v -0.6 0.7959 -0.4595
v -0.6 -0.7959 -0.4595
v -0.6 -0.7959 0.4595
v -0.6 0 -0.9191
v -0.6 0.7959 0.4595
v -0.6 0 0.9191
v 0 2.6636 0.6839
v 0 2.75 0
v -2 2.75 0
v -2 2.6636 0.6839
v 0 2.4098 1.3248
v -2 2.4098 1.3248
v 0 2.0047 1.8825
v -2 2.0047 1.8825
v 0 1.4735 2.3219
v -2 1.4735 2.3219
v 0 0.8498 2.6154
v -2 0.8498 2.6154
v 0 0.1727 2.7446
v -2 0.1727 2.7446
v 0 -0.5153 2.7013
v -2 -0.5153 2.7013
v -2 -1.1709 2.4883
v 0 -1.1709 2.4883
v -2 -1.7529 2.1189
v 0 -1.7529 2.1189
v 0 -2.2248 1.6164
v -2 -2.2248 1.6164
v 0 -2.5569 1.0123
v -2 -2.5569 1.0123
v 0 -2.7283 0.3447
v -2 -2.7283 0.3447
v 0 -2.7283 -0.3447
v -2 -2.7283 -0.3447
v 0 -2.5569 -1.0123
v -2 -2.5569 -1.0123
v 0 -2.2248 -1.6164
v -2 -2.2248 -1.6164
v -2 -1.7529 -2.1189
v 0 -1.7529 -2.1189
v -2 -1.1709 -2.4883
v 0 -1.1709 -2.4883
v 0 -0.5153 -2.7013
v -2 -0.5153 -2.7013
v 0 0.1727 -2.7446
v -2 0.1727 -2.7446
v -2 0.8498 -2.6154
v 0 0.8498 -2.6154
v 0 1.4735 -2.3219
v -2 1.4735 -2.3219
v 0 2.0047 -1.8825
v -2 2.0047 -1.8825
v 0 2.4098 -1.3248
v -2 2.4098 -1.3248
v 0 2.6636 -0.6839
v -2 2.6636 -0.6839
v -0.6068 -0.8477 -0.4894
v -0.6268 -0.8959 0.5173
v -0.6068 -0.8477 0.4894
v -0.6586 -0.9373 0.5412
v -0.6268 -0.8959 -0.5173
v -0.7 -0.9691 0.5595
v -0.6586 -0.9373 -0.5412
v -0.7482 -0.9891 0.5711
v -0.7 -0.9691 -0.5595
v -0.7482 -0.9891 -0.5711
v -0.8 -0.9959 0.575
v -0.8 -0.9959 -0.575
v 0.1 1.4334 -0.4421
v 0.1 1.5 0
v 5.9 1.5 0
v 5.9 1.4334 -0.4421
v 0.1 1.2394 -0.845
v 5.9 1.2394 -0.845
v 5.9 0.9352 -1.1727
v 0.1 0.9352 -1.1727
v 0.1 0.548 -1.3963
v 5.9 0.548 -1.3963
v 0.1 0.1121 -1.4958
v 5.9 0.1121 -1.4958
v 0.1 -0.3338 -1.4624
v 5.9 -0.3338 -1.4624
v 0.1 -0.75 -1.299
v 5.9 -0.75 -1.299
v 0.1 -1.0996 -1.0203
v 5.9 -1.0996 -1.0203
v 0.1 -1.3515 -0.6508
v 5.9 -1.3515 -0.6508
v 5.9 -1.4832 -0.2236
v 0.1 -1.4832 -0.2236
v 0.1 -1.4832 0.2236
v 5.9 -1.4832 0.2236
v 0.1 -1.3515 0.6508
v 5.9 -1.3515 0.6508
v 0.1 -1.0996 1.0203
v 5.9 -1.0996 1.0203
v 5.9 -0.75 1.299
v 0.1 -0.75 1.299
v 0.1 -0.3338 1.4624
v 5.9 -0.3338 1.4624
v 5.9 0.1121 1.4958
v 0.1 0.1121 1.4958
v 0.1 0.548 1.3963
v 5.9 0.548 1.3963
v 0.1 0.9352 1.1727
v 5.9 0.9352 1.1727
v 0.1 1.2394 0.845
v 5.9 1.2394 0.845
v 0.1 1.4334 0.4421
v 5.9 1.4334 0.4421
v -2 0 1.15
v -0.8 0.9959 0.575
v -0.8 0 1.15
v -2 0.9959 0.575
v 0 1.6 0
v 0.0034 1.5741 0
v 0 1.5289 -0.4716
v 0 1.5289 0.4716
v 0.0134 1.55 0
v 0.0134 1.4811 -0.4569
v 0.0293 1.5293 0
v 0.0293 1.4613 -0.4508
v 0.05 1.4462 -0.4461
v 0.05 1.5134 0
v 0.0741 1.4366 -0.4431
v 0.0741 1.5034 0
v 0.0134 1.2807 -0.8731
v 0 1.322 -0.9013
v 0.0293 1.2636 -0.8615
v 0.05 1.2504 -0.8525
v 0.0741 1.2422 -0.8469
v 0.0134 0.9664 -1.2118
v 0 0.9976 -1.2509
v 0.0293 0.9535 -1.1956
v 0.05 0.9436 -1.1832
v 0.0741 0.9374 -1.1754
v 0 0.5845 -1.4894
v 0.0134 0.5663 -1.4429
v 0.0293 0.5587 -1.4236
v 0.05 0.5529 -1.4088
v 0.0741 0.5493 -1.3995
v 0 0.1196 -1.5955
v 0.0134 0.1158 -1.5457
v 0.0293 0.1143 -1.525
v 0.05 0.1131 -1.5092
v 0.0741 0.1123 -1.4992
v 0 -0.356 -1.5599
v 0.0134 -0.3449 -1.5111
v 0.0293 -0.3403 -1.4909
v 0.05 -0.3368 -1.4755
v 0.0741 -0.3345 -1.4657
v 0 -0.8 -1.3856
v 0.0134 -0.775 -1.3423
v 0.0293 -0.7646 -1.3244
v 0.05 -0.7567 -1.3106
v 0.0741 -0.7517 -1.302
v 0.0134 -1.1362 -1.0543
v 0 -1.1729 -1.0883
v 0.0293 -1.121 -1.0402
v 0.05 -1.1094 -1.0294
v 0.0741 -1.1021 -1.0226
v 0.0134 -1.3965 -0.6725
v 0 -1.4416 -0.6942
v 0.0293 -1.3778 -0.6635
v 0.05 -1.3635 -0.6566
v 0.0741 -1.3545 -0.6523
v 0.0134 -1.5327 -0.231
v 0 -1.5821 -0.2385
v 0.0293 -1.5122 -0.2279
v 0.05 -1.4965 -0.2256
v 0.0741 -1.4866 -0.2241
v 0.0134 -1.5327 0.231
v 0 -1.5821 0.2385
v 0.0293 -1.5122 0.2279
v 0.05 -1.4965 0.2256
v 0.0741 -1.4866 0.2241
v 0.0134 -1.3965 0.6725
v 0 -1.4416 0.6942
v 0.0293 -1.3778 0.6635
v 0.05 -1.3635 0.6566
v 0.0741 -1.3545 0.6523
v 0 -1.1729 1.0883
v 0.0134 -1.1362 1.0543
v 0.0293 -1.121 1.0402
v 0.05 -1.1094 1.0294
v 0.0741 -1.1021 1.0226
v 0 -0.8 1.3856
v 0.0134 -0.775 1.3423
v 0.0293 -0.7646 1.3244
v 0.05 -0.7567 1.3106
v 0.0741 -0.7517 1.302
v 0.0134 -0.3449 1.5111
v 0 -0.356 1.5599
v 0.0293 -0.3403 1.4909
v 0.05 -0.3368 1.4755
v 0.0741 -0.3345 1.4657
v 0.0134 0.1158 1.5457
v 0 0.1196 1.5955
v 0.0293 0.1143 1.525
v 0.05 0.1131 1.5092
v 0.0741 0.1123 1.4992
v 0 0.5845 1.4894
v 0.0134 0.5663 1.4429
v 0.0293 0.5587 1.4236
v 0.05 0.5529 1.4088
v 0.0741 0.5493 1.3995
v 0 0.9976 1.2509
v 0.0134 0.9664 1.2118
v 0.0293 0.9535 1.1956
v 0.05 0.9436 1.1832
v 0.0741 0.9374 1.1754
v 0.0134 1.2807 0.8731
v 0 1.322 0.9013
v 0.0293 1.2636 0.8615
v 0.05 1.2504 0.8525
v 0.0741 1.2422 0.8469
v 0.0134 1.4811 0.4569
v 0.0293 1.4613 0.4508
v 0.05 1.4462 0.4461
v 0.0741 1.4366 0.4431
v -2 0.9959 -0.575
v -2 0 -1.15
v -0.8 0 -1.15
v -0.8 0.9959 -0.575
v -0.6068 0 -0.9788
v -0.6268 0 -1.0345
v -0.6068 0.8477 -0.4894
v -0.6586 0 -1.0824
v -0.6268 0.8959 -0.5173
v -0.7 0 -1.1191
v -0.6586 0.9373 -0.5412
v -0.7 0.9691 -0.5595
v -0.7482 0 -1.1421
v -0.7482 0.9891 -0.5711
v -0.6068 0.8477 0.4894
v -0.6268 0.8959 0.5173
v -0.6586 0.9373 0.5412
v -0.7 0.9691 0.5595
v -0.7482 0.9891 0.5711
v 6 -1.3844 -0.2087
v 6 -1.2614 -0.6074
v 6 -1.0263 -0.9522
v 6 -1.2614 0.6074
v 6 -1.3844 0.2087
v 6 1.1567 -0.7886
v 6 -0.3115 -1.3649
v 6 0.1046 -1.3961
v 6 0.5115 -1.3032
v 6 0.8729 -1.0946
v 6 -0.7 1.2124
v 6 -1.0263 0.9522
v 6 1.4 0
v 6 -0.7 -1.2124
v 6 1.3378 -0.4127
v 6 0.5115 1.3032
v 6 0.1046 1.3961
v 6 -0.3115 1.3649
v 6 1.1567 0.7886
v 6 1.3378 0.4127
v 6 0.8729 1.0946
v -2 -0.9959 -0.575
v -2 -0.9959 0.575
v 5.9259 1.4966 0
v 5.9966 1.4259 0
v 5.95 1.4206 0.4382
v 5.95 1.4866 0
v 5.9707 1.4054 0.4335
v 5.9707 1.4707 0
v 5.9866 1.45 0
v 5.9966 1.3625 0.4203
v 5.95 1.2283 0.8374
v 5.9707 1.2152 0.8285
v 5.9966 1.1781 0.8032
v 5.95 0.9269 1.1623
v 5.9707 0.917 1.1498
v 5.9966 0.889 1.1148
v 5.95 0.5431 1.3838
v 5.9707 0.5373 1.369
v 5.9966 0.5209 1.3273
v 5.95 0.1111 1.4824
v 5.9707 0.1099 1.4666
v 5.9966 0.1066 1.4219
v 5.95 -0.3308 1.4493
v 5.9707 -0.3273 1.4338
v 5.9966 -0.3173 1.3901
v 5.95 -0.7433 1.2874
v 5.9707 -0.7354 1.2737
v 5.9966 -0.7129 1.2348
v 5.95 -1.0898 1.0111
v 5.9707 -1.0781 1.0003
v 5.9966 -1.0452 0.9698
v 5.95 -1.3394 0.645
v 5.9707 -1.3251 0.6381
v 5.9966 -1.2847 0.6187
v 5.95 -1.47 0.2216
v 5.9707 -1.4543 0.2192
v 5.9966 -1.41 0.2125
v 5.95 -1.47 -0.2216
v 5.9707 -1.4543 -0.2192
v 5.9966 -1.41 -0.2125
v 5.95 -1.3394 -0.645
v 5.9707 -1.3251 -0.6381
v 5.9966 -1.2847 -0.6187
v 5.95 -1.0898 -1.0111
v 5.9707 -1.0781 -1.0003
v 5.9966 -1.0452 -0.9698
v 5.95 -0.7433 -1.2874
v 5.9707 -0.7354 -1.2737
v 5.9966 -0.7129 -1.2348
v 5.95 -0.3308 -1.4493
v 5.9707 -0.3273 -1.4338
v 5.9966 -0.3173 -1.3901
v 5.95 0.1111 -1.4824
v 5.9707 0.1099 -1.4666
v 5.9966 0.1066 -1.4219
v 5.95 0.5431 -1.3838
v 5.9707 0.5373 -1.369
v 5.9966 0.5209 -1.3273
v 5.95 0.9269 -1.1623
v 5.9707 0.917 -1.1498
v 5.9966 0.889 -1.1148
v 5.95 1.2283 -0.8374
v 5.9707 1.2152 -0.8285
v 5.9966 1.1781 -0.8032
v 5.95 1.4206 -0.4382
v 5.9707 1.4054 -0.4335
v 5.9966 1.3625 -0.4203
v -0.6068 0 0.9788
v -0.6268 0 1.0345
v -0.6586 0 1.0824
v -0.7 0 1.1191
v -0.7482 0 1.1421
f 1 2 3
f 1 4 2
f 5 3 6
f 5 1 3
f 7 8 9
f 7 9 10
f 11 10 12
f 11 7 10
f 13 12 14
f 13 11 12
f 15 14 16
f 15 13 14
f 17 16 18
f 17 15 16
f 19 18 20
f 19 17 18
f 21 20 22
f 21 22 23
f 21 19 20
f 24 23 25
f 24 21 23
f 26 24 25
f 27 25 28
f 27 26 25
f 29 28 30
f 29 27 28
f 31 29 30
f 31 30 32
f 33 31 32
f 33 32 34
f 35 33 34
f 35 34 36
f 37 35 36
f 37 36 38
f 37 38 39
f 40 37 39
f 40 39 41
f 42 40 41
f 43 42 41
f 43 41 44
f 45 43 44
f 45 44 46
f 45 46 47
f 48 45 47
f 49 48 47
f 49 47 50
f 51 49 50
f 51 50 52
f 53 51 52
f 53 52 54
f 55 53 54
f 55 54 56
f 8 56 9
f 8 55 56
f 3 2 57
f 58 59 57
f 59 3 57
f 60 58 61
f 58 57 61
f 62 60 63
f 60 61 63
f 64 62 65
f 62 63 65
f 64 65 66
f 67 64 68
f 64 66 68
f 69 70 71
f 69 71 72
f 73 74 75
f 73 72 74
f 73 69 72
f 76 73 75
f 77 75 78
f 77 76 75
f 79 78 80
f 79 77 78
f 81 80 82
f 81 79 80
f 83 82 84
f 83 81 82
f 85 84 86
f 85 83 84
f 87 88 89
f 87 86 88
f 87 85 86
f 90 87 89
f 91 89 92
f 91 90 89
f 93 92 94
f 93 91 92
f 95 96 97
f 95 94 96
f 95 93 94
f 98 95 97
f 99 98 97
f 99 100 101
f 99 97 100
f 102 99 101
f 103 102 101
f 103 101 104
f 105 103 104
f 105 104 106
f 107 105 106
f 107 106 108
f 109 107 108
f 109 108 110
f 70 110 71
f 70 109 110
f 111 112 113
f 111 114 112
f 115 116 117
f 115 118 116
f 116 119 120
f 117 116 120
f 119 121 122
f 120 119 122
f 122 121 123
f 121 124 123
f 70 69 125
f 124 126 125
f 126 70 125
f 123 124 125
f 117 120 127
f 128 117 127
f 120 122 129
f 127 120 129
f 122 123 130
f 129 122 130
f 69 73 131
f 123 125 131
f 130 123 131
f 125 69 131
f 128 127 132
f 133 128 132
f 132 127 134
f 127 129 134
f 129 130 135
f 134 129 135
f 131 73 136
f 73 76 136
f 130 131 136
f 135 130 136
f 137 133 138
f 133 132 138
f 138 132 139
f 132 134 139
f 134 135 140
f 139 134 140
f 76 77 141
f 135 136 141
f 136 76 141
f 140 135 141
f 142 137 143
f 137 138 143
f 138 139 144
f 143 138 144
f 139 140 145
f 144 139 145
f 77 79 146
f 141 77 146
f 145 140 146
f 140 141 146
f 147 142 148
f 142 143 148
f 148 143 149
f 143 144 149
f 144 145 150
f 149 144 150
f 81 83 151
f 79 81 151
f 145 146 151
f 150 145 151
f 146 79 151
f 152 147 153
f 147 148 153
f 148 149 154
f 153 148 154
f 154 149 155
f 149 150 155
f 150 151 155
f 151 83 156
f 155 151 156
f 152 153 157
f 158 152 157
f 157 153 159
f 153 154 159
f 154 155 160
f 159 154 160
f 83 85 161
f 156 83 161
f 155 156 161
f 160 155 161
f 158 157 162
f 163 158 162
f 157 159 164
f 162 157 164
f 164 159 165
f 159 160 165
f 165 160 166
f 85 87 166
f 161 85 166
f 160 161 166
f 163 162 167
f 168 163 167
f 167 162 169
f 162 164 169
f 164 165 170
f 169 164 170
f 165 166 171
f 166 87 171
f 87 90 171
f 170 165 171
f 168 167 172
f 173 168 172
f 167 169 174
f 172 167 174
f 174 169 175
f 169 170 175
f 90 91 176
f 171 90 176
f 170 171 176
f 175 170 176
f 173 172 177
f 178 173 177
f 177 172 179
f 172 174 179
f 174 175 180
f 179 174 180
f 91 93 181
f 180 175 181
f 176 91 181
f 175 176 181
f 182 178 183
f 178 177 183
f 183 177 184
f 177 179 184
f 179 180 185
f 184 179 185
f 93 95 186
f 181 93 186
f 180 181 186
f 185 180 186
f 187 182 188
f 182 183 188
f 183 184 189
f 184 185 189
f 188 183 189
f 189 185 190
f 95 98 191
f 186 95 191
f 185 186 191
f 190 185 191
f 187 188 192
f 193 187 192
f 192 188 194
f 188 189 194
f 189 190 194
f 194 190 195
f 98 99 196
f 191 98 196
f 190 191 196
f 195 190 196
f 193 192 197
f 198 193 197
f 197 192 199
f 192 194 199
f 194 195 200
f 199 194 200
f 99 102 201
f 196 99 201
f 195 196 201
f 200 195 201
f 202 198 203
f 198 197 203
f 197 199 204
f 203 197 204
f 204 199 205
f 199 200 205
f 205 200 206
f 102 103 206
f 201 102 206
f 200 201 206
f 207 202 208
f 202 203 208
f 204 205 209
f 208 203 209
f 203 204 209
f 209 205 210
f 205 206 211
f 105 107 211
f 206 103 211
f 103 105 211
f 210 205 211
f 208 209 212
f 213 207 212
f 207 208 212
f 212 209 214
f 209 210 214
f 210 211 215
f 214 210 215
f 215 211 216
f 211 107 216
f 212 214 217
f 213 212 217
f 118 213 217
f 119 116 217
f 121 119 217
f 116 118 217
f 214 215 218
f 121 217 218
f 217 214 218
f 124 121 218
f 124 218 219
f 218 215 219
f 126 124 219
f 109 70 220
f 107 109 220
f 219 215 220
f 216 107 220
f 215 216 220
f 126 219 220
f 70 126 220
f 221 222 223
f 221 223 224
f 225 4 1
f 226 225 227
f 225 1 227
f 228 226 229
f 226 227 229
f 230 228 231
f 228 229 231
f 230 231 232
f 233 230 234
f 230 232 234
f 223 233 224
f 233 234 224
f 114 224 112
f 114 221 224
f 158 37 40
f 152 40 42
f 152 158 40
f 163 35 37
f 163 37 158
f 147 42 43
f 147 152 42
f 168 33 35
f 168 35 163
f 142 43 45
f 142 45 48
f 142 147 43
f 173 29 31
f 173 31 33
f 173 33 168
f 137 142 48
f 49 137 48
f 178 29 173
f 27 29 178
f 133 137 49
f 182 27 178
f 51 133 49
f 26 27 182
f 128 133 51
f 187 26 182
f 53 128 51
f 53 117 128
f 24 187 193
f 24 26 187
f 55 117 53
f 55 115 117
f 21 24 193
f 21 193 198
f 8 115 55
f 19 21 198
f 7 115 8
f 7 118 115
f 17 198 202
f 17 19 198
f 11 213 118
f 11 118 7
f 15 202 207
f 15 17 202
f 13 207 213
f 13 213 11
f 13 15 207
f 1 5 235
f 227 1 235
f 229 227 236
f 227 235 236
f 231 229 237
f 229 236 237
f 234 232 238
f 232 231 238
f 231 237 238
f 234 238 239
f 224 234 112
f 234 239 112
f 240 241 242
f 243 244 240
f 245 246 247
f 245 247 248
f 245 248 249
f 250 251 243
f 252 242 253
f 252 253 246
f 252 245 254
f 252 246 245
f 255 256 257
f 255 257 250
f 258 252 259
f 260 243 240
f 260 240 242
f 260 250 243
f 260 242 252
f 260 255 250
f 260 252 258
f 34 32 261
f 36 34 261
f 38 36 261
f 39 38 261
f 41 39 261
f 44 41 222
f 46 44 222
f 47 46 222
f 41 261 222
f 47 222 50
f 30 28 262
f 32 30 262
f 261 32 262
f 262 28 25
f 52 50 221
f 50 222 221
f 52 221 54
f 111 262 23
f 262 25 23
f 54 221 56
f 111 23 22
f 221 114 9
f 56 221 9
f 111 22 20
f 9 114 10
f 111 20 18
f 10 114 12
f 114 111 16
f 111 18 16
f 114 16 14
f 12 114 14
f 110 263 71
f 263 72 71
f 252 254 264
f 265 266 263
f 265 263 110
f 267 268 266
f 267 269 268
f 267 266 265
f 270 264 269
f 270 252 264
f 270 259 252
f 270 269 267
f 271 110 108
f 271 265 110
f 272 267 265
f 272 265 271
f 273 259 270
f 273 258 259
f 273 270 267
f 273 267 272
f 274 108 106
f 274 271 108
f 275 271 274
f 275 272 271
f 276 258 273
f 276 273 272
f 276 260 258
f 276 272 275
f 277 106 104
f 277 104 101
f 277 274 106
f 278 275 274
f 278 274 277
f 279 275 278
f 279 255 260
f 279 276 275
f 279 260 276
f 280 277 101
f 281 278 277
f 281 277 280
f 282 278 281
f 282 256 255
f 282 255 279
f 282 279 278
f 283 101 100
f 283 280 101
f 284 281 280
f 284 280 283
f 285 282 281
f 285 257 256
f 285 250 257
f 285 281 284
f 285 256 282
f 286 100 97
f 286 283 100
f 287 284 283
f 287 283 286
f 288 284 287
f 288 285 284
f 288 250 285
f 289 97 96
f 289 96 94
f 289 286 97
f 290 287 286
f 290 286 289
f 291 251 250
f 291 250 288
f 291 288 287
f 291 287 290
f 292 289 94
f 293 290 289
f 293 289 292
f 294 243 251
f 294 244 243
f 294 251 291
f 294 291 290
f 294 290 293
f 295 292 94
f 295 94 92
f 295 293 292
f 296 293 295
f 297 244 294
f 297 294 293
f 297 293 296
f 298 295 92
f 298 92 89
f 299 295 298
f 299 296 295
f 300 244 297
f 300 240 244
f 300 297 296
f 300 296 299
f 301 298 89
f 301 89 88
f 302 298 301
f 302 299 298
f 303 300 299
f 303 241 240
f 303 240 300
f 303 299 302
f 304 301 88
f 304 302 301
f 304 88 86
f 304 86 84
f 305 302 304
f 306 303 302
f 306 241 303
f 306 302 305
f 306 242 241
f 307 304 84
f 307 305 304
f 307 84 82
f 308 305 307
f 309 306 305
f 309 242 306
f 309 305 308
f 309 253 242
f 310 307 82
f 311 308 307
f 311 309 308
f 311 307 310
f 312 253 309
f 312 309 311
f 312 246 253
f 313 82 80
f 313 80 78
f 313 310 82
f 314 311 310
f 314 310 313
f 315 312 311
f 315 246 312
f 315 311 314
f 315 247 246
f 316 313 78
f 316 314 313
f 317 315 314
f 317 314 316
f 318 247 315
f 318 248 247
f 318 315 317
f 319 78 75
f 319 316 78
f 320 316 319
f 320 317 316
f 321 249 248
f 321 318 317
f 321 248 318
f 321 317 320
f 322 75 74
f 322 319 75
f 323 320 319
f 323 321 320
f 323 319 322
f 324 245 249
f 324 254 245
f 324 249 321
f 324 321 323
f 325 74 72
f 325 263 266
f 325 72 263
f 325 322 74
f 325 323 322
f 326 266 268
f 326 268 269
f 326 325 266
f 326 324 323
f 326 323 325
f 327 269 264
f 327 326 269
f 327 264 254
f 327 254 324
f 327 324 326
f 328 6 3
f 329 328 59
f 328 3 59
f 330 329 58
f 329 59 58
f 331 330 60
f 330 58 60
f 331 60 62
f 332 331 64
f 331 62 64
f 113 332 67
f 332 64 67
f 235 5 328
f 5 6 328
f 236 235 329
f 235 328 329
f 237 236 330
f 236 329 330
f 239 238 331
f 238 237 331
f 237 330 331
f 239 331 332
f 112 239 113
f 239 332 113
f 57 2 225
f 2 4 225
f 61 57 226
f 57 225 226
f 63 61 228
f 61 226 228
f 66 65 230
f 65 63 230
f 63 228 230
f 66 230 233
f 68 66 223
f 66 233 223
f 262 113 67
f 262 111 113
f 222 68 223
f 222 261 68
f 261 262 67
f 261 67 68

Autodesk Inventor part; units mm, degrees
ref_plane "YZ Plane" through (0, 0, 0) normal (1, 0, 0) x (0, 1, 0)
ref_plane "XZ Plane" through (0, 0, 0) normal (0, 1, 0) x (-1, 0, 0)
ref_plane "XY Plane" through (0, 0, 0) normal (0, 0, 1) x (1, 0, 0)
sketch "スケッチ1" plane through (0, 0, 0) normal (0, 0, 1) x (1, 0, 0)
  line L0 (0, 0) -> (6, 0)
  line L1 (6, 0) -> (6, 1.5)
  line L2 (6, 1.5) -> (0, 1.5)
  line L3 (0, 1.5) -> (0, 0)
  line L4 (0, 0) -> (0, 2.75)
  line L5 (0, 0) -> (-2, 0)
  line L6 (-2, 0) -> (0, 0)
  line L7 (-2, 0) -> (-2, 1.15)
  line L8 (0, 0) -> (-2, 0)
  line L9 (-2, 0) -> (-2, 2.75)
  line L10 (-2, 2.75) -> (0, 2.75)
  line L11 (0, 2.75) -> (0, 0)
  dimension "d0" = 1.5
  dimension "d1" = 6
  dimension "d3" = 2
  dimension "d4" = 2.75
  dimension "d5" = 1.15
revolve "回転1" add sketch "スケッチ1" angle 360 about axis through (-2, 0, 0) along (1, 0, 0)
thread "ねじ1" size "M3x0.5" class "6g" standard "ANSI Metric M Profile" length 100
sketch "スケッチ2" plane through (-2, 0, 0) normal (-1, 0, 0) x (0, 0, 1)
  circle A0 centre (0, 0) radius 1.15 projected
  line L0 (-0.575, 0.9959) -> (0.575, 0.9959)
  line L1 (0.575, 0.9959) -> (1.15, 0)
  line L2 (1.15, 0) -> (0.575, -0.9959)
  line L3 (0.575, -0.9959) -> (-0.575, -0.9959)
  line L4 (-0.575, -0.9959) -> (-1.15, 0)
  line L5 (-1.15, 0) -> (-0.575, 0.9959)
  dimension "d10" = 1.15
  dimension "d11" = 1.9919
extrude "押し出し1" cut sketch "スケッチ2" against normal blind 1.4 contours L2 L3 L4 L5 L0 L1
fillet "フィレット1" radius 0.2 6 edges at (-0.6, 0.9959, 0) (-0.6, 0.498, 0.8625) (-0.6, 0.498, -0.8625) (-0.6, -0.498, -0.8625) (-0.6, -0.9959, 0) (-0.6, -0.498, 0.8625)
fillet "フィレット2" radius 0.1 1 edges at (0, -1.5, 0)
fillet "フィレット3" radius 0.1 1 edges at (6, -1.5, 0)
properties part number "ネジキャップM3L6" material "鋼"
